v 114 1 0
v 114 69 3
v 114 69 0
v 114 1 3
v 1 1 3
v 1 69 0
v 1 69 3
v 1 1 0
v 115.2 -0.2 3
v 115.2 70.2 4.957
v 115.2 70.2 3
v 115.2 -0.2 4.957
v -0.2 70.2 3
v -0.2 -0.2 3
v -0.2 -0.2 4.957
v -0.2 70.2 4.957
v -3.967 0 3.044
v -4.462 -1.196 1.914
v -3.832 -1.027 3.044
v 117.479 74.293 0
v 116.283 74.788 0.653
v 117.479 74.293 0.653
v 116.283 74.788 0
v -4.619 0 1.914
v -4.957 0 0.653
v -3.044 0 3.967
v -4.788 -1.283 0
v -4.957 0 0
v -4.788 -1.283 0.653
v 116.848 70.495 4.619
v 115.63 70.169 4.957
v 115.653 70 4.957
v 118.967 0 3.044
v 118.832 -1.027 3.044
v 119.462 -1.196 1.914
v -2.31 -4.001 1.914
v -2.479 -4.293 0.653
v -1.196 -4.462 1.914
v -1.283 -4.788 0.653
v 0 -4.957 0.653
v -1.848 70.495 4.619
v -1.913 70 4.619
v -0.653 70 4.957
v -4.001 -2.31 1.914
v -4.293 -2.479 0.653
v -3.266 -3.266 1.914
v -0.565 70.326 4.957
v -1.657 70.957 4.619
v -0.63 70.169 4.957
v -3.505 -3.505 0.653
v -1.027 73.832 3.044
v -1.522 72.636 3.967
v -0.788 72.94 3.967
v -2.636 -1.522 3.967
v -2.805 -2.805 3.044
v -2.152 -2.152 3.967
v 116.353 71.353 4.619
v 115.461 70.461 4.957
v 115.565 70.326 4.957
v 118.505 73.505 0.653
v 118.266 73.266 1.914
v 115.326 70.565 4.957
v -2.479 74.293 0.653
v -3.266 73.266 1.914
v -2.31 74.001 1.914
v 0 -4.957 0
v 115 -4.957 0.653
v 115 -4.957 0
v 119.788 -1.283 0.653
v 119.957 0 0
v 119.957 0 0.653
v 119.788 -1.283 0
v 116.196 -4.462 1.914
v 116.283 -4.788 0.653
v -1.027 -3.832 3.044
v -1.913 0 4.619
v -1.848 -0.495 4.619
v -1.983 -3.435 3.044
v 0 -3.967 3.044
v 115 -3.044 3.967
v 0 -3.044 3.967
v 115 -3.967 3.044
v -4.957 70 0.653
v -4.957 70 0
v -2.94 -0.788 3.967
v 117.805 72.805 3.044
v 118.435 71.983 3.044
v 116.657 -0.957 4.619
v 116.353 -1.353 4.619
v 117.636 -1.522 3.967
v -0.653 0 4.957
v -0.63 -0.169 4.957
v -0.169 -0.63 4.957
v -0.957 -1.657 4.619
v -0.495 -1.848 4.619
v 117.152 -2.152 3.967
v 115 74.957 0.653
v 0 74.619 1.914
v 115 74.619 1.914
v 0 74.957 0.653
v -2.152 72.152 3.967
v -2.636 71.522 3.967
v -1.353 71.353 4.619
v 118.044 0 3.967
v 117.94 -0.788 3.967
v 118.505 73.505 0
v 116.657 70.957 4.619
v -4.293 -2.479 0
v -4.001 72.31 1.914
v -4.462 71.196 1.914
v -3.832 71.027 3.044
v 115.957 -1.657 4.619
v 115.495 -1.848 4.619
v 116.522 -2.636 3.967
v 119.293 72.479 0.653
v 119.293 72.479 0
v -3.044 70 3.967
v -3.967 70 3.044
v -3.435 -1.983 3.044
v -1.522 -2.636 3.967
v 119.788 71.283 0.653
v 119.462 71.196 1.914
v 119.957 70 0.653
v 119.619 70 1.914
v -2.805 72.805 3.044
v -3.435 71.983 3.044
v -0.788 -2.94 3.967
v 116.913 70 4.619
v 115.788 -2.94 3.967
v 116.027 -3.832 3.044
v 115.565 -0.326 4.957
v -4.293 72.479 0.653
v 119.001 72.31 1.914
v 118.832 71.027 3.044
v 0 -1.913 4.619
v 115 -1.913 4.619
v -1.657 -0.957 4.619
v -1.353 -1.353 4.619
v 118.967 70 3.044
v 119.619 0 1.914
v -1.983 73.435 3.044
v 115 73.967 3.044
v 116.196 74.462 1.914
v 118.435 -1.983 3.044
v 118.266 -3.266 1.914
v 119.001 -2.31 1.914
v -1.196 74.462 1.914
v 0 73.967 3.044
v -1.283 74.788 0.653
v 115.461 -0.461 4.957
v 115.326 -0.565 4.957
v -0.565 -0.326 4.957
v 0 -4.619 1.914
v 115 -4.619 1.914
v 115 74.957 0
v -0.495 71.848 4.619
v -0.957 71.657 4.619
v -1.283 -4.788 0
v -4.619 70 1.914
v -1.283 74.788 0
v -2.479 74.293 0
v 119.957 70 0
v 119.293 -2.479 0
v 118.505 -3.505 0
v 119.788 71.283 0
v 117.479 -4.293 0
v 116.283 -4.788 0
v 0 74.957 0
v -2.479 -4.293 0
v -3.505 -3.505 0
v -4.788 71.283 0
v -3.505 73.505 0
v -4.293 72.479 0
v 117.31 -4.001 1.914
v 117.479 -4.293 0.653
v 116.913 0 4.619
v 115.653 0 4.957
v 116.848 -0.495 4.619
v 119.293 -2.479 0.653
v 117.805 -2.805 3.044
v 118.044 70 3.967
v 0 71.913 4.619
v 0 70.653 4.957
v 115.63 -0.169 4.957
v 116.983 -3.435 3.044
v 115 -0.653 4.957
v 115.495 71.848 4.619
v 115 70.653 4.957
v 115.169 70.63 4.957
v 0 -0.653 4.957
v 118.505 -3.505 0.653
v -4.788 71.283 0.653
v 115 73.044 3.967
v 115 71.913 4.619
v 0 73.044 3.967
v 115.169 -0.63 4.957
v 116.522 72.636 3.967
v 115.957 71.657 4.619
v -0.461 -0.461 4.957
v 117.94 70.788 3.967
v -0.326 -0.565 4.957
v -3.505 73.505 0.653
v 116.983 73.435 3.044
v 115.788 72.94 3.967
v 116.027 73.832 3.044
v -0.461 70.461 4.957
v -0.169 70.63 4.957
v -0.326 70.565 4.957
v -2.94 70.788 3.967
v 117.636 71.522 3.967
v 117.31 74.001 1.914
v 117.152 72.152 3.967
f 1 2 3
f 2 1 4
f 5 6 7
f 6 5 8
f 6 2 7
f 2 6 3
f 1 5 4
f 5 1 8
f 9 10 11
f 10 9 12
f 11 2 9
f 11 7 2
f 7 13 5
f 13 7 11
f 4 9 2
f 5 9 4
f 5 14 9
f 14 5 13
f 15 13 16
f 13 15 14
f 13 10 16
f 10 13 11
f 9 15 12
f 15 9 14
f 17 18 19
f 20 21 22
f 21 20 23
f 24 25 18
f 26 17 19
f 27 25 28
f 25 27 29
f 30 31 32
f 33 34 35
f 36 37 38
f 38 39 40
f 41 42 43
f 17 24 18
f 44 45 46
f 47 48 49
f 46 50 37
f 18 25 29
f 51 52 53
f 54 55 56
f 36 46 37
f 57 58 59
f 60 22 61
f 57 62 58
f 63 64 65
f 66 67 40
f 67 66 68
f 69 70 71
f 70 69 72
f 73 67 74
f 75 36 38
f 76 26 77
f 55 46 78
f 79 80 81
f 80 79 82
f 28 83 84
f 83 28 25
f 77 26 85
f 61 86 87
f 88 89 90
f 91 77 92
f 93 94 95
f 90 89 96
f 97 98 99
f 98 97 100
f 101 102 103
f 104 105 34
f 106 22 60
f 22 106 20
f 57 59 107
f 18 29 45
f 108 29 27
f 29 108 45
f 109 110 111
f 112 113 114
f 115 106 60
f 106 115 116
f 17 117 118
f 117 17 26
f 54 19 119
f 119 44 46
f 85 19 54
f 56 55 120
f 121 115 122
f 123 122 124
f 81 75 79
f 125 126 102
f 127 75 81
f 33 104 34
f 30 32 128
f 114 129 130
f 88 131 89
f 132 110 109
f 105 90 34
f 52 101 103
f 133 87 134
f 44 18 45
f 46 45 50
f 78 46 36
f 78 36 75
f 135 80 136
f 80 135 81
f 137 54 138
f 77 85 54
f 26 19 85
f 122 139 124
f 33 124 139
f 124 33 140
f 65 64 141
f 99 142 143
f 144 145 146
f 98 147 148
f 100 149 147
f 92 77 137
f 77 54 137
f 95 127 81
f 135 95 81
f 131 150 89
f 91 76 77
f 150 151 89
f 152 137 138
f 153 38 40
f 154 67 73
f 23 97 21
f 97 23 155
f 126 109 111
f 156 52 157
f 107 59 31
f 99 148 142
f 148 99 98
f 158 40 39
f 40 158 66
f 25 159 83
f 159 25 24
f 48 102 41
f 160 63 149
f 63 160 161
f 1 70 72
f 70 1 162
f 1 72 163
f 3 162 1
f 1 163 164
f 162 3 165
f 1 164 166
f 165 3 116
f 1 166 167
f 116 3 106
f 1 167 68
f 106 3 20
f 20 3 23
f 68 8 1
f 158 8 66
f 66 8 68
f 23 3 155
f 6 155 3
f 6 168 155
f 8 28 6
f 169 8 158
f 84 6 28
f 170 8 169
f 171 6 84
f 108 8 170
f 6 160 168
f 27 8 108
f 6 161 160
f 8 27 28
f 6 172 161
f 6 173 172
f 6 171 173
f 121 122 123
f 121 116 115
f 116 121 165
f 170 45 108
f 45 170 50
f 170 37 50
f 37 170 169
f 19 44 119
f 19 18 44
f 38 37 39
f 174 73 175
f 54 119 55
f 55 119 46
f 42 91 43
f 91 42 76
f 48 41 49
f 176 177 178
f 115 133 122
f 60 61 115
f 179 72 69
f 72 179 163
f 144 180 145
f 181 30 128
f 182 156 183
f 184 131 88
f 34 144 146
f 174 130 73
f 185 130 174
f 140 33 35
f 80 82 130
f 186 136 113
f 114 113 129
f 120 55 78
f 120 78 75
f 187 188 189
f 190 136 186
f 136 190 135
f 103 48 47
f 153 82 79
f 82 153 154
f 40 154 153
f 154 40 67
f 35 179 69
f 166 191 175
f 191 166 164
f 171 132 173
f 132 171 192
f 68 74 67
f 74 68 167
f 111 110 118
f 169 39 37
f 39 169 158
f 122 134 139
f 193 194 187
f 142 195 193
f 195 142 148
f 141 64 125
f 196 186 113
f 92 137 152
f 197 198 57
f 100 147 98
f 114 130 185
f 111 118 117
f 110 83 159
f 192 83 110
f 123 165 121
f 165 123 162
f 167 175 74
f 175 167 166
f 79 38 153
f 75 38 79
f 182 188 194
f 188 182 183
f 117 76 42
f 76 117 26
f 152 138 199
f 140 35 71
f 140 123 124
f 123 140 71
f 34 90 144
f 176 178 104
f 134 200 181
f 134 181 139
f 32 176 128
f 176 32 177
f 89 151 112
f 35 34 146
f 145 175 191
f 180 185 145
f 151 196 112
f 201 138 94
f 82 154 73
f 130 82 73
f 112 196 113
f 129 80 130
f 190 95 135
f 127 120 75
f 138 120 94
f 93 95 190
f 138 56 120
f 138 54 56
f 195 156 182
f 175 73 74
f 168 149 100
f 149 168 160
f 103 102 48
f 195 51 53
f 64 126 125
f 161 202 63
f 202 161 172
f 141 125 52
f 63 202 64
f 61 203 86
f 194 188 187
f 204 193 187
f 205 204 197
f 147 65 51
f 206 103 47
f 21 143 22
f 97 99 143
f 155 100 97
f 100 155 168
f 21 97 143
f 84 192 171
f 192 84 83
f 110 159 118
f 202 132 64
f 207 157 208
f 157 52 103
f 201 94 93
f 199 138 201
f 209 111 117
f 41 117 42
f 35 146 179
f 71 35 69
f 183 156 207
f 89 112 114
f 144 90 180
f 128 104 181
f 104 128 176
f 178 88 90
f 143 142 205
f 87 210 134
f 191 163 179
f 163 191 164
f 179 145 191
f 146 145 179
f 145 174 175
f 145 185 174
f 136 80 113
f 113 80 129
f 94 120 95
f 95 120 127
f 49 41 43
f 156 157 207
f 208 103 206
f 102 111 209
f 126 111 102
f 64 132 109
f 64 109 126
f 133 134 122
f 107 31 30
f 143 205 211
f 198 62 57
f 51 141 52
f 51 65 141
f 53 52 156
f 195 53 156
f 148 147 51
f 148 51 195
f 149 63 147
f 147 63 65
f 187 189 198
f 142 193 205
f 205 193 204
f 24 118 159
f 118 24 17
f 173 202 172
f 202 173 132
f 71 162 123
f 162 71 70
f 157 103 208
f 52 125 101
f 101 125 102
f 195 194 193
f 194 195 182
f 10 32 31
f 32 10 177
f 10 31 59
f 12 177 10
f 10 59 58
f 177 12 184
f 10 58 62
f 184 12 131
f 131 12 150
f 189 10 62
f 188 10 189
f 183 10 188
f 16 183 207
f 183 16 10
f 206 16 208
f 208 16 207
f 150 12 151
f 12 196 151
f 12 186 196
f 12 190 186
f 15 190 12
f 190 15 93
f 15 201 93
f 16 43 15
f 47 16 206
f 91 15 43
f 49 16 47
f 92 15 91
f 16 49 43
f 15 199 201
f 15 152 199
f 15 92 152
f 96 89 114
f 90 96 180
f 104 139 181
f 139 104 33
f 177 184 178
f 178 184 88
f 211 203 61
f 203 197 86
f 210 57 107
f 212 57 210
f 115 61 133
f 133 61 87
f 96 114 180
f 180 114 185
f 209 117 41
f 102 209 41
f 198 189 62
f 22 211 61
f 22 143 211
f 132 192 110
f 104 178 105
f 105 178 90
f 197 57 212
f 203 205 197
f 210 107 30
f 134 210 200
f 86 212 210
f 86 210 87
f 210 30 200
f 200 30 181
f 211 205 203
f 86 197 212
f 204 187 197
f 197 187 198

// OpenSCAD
union() {
	difference() {
		translate(v = [0, 0, 0]) {
			minkowski() {
				cube(size = [115, 70, 0.0001000000]);
				difference() {
					sphere($fn = 24, r = 5);
					translate(v = [-5, -5, -5]) {
						cube(size = [10, 10, 5]);
					}
				}
			}
		}
		union() {
			translate(v = [1, 1, -1]) {
				cube(size = [113, 68, 10]);
			}
			translate(v = [-0.2000000000, -0.2000000000, 3]) {
				cube(size = [115.4000000000, 70.4000000000, 10]);
			}
		}
	}
}
